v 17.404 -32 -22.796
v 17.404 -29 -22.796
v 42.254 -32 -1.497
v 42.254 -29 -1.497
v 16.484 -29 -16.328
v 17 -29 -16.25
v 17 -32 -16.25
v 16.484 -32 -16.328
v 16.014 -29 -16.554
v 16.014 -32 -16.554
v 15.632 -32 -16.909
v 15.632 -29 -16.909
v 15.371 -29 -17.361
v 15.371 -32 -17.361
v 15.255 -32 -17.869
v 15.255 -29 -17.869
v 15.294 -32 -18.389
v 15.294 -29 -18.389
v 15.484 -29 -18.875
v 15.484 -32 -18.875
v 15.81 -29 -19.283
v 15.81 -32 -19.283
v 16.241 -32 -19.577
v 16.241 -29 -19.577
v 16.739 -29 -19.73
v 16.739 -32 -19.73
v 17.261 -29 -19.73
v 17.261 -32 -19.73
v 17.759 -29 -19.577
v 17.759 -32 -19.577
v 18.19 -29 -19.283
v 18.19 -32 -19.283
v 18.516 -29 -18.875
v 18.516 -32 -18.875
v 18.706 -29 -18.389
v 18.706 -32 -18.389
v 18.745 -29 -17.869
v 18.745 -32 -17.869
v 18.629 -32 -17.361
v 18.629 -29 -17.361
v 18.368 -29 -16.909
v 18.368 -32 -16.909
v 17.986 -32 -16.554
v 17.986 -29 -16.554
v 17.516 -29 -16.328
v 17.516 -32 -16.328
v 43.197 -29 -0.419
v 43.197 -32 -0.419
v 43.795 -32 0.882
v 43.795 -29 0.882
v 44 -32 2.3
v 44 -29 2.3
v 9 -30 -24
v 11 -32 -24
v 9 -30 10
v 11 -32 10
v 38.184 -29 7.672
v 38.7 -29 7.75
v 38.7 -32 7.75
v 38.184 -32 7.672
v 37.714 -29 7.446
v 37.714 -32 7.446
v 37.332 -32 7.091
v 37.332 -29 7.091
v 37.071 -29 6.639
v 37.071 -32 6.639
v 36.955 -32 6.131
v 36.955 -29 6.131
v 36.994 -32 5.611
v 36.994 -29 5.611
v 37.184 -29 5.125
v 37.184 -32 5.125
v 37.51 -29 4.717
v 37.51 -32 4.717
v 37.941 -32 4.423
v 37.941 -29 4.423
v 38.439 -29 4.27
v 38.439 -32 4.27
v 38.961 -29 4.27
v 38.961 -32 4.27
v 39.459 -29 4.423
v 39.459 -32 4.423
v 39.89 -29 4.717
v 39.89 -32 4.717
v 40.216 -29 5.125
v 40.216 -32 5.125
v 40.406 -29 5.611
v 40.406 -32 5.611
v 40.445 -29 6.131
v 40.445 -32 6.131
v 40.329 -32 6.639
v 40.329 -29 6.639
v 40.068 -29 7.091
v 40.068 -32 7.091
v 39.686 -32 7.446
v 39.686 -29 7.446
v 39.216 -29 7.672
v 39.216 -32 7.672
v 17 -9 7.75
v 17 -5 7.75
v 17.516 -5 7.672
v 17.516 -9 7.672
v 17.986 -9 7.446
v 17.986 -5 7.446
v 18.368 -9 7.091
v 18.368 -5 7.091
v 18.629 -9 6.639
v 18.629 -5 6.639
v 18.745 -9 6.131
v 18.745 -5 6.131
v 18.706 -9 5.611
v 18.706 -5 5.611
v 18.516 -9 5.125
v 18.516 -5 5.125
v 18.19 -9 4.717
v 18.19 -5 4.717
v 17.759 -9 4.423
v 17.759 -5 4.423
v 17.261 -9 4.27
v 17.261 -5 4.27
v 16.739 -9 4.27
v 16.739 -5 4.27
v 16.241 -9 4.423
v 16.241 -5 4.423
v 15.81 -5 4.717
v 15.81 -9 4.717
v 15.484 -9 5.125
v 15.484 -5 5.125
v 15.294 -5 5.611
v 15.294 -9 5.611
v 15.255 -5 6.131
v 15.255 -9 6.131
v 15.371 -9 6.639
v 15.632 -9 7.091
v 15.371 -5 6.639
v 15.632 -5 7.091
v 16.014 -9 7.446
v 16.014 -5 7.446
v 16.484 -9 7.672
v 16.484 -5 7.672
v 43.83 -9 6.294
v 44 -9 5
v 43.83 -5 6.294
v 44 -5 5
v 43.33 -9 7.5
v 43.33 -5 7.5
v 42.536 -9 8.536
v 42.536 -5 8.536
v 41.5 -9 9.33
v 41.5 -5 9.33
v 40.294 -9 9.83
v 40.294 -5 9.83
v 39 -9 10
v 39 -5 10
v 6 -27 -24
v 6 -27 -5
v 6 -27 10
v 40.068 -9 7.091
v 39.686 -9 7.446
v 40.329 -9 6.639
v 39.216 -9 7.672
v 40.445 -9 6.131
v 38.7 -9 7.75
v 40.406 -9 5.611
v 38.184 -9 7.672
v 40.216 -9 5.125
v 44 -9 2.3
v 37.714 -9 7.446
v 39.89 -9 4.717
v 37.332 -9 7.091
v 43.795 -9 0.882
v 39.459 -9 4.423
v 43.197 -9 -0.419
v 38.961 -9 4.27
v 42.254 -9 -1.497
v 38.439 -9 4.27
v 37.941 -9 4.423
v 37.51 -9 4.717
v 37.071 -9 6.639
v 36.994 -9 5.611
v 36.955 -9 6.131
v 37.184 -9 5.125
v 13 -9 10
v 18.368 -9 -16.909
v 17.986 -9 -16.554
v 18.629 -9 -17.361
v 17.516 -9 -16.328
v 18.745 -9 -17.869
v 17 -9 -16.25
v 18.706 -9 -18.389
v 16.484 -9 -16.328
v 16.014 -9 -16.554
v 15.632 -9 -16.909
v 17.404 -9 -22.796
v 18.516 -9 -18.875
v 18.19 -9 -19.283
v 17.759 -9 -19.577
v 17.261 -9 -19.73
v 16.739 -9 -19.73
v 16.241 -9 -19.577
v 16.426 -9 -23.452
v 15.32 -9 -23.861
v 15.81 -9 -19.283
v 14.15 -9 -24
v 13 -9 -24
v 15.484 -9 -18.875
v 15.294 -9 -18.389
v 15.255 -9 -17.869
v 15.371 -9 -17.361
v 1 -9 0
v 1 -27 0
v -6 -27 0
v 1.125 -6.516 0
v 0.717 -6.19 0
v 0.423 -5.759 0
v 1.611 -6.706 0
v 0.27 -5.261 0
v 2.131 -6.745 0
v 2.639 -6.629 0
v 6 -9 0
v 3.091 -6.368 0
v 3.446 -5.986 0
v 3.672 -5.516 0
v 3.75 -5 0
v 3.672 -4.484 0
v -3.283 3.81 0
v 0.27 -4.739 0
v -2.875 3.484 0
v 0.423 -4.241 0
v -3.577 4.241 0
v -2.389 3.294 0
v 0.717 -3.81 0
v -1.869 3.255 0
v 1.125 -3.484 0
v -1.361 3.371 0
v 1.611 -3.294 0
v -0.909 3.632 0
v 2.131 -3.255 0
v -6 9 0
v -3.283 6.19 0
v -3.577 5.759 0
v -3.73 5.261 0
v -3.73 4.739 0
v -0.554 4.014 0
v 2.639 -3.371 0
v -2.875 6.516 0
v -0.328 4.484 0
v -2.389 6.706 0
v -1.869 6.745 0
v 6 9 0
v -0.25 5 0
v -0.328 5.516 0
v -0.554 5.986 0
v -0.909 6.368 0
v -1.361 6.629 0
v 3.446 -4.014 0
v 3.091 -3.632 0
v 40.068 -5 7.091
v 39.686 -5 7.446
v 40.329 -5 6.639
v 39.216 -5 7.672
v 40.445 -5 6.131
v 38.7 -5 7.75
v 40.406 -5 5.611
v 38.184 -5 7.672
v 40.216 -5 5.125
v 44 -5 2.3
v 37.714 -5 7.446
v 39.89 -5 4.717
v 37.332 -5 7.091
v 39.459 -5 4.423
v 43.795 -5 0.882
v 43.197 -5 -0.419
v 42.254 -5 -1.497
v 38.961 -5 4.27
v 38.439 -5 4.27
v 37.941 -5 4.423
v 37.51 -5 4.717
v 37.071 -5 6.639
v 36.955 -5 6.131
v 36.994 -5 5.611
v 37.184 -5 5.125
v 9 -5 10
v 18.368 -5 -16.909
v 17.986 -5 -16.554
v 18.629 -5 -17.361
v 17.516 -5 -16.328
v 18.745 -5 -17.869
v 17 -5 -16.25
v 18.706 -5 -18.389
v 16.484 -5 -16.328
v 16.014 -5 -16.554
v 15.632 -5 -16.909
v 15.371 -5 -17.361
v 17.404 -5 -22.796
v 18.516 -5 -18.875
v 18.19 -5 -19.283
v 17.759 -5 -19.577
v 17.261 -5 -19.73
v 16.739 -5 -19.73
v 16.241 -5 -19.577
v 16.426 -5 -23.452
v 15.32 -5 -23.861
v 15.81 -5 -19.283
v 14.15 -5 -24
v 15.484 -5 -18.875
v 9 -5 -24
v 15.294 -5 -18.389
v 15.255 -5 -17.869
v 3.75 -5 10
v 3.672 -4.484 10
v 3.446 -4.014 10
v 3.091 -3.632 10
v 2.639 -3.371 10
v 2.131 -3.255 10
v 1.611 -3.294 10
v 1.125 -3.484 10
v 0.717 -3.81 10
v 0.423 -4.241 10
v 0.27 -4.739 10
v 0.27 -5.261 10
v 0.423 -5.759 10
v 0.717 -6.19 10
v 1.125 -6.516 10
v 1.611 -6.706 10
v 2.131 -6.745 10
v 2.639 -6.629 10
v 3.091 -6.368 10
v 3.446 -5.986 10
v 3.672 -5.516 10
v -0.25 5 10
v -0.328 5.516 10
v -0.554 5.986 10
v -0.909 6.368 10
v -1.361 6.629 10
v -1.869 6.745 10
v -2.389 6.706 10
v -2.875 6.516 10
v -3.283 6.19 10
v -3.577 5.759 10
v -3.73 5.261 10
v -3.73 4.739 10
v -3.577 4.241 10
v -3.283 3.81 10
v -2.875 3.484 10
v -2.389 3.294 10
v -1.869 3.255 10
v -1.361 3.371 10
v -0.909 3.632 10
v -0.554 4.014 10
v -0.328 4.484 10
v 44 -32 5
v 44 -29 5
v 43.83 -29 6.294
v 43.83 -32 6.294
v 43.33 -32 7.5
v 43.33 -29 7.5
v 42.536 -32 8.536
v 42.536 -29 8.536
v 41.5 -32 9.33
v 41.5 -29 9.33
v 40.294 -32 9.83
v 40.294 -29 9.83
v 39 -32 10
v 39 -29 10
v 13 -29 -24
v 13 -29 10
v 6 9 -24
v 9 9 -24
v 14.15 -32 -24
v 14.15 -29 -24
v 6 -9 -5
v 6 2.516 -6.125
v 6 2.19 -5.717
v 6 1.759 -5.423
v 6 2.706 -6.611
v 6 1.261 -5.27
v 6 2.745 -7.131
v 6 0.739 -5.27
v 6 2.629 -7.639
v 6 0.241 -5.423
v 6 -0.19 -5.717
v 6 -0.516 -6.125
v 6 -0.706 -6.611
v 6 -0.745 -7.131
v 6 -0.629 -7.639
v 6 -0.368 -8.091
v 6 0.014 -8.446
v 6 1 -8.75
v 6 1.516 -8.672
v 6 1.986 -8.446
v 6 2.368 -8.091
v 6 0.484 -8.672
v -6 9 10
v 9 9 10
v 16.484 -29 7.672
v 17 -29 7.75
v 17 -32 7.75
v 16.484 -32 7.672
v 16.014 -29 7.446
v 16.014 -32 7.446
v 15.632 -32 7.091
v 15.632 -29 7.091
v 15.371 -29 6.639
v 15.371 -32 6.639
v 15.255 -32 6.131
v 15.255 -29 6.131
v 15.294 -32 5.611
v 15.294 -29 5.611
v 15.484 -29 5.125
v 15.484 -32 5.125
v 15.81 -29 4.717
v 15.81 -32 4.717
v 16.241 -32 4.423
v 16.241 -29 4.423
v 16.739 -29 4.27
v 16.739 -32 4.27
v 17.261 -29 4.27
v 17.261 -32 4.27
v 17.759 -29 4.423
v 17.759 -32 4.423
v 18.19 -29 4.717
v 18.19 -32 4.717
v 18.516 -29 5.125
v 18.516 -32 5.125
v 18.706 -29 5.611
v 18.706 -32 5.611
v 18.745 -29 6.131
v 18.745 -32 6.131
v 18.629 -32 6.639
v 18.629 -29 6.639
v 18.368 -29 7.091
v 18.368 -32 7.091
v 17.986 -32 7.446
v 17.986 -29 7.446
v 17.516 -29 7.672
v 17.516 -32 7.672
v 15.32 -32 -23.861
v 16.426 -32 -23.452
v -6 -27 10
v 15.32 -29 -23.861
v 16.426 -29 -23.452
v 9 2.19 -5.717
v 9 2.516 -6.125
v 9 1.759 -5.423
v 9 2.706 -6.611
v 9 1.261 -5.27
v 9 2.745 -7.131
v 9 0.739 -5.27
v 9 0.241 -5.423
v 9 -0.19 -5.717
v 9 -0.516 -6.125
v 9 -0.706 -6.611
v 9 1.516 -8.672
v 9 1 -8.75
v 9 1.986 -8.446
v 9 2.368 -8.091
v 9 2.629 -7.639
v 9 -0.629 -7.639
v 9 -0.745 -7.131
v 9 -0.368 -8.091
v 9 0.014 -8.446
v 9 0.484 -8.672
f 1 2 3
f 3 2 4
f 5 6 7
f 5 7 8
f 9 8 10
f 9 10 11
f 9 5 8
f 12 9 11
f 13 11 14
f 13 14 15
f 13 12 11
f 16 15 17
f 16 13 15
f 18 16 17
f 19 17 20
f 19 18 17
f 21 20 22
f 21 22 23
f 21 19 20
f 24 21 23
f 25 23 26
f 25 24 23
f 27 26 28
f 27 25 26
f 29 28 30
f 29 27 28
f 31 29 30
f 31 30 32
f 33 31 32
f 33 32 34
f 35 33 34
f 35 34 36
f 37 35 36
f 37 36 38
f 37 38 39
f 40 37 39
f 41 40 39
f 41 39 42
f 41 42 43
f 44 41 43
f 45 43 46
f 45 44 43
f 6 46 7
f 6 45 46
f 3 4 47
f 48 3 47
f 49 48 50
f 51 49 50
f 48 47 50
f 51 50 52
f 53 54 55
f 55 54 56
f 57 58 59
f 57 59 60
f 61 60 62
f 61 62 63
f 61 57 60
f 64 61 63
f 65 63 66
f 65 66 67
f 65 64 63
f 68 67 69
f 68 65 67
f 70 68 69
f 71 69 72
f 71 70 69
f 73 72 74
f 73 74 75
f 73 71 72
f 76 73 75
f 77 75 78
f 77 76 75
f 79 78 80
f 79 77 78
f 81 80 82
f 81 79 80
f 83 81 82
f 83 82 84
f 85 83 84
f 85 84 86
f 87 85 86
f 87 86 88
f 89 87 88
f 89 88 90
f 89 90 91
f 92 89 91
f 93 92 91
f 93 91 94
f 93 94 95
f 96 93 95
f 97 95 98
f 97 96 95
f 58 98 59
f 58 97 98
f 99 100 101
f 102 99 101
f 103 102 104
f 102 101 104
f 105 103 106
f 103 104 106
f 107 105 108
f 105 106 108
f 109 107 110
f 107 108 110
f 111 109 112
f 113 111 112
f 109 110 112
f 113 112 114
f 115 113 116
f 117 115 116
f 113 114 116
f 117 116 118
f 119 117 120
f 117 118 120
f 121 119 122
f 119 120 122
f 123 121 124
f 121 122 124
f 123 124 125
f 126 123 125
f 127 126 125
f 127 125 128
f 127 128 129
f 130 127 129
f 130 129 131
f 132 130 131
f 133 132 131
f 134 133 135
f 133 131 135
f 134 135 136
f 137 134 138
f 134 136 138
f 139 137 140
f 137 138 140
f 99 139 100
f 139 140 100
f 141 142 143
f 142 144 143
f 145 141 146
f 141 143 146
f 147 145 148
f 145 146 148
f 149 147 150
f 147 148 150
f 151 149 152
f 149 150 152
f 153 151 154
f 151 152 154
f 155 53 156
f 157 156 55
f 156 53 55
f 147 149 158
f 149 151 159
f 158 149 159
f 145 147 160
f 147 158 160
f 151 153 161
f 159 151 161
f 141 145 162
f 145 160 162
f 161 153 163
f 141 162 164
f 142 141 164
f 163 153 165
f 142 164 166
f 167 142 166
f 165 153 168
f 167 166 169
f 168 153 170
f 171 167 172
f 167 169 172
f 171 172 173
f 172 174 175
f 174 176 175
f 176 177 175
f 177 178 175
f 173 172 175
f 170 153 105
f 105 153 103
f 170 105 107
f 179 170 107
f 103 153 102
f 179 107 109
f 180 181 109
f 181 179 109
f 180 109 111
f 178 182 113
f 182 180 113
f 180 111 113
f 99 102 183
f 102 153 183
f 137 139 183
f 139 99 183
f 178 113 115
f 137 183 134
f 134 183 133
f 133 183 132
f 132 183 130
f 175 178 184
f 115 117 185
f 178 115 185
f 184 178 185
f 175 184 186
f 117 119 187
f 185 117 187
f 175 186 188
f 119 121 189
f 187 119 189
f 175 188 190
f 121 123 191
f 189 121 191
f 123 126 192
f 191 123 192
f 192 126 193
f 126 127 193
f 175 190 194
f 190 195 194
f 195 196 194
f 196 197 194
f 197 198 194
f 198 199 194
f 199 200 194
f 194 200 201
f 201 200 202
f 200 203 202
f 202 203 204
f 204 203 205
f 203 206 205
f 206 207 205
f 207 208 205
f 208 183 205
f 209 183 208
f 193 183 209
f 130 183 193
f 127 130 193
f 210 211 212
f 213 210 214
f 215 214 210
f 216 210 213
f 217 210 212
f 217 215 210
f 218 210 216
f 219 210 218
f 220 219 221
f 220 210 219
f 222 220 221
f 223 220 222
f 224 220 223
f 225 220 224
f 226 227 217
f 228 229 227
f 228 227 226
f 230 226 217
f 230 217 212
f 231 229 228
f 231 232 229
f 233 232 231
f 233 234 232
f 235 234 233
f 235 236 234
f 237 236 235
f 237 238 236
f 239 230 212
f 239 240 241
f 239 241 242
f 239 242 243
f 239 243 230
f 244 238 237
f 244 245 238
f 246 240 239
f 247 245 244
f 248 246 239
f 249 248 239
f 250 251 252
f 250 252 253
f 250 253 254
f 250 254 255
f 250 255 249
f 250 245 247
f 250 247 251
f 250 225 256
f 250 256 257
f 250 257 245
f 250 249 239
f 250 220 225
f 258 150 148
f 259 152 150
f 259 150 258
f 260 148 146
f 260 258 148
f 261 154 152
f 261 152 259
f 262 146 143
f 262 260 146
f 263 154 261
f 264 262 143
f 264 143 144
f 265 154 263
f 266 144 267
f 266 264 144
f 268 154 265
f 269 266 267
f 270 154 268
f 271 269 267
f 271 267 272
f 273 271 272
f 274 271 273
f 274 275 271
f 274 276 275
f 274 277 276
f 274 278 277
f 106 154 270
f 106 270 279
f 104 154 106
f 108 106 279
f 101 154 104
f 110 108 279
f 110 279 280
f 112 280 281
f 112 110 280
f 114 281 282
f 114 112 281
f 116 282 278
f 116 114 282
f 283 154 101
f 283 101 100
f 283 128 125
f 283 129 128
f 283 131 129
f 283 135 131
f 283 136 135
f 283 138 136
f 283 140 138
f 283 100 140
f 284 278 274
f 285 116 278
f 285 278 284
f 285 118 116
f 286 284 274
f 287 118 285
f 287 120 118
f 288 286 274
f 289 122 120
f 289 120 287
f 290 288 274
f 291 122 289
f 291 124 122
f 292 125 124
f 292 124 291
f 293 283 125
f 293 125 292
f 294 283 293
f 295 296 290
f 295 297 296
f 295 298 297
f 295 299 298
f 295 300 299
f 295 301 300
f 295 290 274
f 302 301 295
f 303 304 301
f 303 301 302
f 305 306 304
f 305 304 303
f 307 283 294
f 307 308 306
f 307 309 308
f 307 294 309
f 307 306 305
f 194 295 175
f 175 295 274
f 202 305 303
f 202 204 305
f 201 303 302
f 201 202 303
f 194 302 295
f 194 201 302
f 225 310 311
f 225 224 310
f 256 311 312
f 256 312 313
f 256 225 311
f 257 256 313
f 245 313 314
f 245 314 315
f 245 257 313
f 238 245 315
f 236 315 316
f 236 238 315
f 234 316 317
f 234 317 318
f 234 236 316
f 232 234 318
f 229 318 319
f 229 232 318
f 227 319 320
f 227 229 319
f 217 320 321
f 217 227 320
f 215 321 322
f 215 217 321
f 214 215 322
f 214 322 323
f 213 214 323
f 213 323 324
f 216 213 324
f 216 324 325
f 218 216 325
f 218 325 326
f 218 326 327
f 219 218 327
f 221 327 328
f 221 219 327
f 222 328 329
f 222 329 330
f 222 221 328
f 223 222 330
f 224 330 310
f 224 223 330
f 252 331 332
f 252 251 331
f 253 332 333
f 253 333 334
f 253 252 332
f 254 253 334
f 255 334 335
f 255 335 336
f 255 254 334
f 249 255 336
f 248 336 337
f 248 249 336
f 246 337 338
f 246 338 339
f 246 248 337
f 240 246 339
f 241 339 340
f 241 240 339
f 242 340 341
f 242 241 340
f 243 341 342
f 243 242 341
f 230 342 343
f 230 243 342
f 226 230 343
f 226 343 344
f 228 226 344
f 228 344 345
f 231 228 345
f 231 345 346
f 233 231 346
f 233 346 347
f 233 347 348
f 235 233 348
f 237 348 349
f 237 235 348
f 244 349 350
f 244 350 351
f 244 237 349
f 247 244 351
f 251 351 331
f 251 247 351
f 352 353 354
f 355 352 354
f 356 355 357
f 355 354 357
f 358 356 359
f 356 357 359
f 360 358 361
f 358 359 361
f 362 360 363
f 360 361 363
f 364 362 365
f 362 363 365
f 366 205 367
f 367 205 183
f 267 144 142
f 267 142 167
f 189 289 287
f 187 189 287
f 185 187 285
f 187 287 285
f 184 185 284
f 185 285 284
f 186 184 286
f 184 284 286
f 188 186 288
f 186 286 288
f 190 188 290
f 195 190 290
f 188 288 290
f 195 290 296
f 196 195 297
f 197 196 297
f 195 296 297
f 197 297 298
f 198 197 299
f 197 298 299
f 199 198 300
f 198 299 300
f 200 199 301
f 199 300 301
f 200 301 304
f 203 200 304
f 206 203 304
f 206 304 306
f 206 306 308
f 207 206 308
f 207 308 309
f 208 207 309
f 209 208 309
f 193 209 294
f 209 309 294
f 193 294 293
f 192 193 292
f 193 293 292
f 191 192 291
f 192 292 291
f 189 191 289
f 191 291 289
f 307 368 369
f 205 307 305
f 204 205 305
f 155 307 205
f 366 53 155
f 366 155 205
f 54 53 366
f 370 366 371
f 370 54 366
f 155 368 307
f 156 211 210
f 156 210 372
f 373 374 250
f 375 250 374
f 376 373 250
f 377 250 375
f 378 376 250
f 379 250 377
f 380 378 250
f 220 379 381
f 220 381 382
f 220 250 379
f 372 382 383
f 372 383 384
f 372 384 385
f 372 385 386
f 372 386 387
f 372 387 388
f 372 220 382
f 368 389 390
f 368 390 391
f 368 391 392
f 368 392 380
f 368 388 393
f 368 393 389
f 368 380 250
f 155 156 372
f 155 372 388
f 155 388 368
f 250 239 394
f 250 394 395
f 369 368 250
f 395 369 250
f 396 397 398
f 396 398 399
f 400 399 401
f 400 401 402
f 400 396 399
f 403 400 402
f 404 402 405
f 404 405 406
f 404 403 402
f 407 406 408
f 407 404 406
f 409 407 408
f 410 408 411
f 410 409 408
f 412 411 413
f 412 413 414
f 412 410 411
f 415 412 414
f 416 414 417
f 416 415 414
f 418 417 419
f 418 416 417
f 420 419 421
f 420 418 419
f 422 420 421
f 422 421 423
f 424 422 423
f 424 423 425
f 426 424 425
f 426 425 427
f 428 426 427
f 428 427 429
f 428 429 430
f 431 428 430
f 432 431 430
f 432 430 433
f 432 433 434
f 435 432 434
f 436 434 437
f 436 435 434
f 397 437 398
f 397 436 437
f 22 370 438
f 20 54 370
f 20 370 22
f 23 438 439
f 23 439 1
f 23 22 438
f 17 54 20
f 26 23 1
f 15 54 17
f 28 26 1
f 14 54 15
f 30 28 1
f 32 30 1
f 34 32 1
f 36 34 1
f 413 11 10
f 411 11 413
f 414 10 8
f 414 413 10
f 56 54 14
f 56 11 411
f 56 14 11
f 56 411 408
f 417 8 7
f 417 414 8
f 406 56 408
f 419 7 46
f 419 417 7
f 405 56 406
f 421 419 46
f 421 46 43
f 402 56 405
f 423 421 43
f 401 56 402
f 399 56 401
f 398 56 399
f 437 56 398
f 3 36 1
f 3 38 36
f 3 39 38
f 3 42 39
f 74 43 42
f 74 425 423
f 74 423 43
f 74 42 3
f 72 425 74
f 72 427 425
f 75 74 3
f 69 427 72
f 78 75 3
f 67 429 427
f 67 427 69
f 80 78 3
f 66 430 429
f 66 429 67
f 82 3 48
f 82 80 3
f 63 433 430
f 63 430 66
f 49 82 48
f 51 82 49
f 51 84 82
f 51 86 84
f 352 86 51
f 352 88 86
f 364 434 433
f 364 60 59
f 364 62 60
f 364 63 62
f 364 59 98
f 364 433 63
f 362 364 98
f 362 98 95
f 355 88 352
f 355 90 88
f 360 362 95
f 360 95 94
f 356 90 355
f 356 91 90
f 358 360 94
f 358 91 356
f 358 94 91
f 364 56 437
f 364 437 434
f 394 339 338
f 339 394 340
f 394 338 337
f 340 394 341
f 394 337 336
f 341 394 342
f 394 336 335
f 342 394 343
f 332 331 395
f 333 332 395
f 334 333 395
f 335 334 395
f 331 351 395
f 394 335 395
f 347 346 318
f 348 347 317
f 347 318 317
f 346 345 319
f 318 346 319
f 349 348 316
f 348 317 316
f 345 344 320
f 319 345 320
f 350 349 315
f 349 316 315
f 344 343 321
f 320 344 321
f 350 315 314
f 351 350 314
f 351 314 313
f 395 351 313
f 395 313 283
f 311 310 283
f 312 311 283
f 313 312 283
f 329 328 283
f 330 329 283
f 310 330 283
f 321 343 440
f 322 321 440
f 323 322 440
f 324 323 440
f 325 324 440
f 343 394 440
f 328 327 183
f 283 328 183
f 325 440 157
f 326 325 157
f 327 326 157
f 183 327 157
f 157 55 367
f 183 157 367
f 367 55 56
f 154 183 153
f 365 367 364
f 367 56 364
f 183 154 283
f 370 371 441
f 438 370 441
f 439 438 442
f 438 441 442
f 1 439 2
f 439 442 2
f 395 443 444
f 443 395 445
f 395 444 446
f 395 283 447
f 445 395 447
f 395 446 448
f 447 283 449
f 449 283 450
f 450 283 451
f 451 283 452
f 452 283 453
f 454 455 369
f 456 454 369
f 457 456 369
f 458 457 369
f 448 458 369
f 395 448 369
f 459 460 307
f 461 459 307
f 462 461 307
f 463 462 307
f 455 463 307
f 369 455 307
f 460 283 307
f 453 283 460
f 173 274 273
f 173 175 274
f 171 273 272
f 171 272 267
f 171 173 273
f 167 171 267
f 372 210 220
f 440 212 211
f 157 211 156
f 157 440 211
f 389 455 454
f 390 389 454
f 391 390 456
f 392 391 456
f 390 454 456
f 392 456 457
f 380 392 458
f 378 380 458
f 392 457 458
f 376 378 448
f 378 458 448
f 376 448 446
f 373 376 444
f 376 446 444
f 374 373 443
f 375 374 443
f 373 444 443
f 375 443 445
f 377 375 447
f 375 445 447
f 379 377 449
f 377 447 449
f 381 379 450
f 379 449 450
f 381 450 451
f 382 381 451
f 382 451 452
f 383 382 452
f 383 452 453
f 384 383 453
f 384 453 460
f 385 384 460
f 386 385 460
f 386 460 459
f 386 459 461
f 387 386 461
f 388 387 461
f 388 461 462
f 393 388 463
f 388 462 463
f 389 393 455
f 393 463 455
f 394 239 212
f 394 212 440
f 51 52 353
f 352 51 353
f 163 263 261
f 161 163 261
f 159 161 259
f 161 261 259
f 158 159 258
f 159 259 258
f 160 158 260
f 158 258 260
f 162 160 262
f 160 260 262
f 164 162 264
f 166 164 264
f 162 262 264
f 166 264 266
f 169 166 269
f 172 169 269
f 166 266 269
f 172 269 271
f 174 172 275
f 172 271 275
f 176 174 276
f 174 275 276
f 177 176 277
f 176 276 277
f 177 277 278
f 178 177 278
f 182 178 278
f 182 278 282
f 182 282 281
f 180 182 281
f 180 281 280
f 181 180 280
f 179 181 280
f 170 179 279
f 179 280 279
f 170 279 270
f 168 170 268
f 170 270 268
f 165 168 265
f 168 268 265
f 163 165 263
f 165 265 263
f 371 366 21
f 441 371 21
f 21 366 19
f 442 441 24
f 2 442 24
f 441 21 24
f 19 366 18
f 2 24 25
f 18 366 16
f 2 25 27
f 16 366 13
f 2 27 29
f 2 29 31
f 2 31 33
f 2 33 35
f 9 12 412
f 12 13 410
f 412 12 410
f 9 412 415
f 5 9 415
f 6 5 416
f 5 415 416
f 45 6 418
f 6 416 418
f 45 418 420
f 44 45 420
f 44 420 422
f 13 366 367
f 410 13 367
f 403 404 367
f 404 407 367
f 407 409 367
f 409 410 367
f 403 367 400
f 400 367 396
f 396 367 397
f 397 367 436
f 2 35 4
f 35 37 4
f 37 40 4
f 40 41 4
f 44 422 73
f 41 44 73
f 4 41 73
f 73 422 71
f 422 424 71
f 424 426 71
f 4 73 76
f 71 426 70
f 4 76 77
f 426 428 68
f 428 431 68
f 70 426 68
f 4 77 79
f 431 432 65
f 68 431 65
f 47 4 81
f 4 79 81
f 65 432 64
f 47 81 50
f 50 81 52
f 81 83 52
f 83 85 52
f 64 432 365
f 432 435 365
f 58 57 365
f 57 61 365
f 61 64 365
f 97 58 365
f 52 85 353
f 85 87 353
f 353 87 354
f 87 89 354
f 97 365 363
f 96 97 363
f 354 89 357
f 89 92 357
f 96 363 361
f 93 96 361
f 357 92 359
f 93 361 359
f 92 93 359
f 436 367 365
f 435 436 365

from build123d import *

# Parameters (mm, degrees)
SZKIC1_W                     = 12
SZKIC1_H                     = 18
SZKIC1_R                     = 1.75
DODANIE_WYCI_GNI_CIE1_DEPTH  = 5
SZKIC2_W                     = 12
SZKIC2_H                     = 36
SZKIC2_R                     = 1.75
DODANIE_WYCI_GNI_CIE2_DEPTH  = 5
SZKIC5_W                     = 34
SZKIC5_H                     = 4
DODANIE_WYCI_GNI_CIE5_DEPTH  = 38
SZKIC6_W                     = 7
SZKIC6_H                     = 34
DODANIE_WYCI_GNI_CIE6_DEPTH  = 18
SZKIC7_R                     = 1.75
WYTNIJ_WYCI_GNI_CIE1_DEPTH   = 4
WYTNIJ_WYCI_GNI_CIE2_DEPTH   = 4
ZAOKR_GLENIE1_R              = 5
SZKIC9_W                     = 5
SZKIC9_H                     = 18
DODANIE_WYCI_GNI_CIE7_DEPTH  = 12
DODANIE_WYCI_GNI_CIE8_DEPTH  = 18
SZKIC11_W                    = 4
SZKIC11_H                    = 34
DODANIE_WYCI_GNI_CIE9_DEPTH  = 2
SZKIC12_R                    = 1.75
SZKIC12_W                    = 4
SZKIC12_H                    = 34
DODANIE_WYCI_GNI_CIE10_DEPTH = 3
SFAZOWANIE1_SIZE             = 3
SFAZOWANIE2_SIZE             = 2
SZKIC13_W                    = 3
SZKIC13_H                    = 34
DODANIE_WYCI_GNI_CIE11_DEPTH = 14
SZKIC14_R                    = 1.75
WYTNIJ_WYCI_GNI_CIE3_DEPTH   = 3


with BuildPart() as part:
    # Szkic1 → Dodanie-wyciągnięcie1 (new body)
    with BuildSketch(Plane.XY):
        Rectangle(SZKIC1_W, SZKIC1_H)
        with Locations((-2, 5)):
            Circle(SZKIC1_R, mode=Mode.SUBTRACT)
        with Locations((2, -5)):
            Circle(SZKIC1_R, mode=Mode.SUBTRACT)
    extrude(amount=DODANIE_WYCI_GNI_CIE1_DEPTH)

    # Szkic2 → Dodanie-wyciągnięcie2 (add)
    with BuildSketch(Plane.XY.offset(5)):
        with Locations((0, -9)):
            Rectangle(SZKIC2_W, SZKIC2_H)
        with Locations((-2, 5)):
            Circle(SZKIC2_R, mode=Mode.SUBTRACT)
        with Locations((2, -5)):
            Circle(SZKIC2_R, mode=Mode.SUBTRACT)
    extrude(amount=DODANIE_WYCI_GNI_CIE2_DEPTH)

    # Szkic5 → Dodanie-wyciągnięcie5 (add)
    with BuildSketch(Plane(origin=(6, 0, 0), x_dir=(0, 0, -1), z_dir=(1, 0, 0))):
        with Locations((7, -7)):
            Rectangle(SZKIC5_W, SZKIC5_H)
    extrude(amount=DODANIE_WYCI_GNI_CIE5_DEPTH)

    # Szkic6 → Dodanie-wyciągnięcie6 (add)
    with BuildSketch(Plane.XZ.offset(9)):
        with Locations((9.5, -7)):
            Rectangle(SZKIC6_W, SZKIC6_H)
    extrude(amount=DODANIE_WYCI_GNI_CIE6_DEPTH)

    # Szkic7 → Wytnij-wyciągnięcie1 (cut)
    with BuildSketch(Plane(origin=(0, -5, 0), x_dir=(1, 0, 0), z_dir=(0, 1, 0))):
        with Locations(Location((17, -6, 0), (0, 0, 270))):
            Circle(SZKIC7_R)
        with Locations(Location((17, 18, 0), (0, 0, 270))):
            Circle(SZKIC7_R)
        with Locations(Location((38.7, -6, 0), (0, 0, 270))):
            Circle(SZKIC7_R)
    extrude(amount=-WYTNIJ_WYCI_GNI_CIE1_DEPTH, mode=Mode.SUBTRACT)

    # Szkic8 → Wytnij-wyciągnięcie2 (cut)
    with BuildSketch(Plane(origin=(0, -5, 0), x_dir=(1, 0, 0), z_dir=(0, 1, 0))):
        Polygon((44, 24), (16, 24), (44, 0), align=None)
    extrude(amount=-WYTNIJ_WYCI_GNI_CIE2_DEPTH, mode=Mode.SUBTRACT)

    # Zaokrąglenie1
    zaokr_glenie1_edges = [part.edges().sort_by_distance(p)[0] for p in [
        (44, -7, 10),
        (16, -7, -24),
        (44, -7, 0),
    ]]
    fillet(zaokr_glenie1_edges, radius=ZAOKR_GLENIE1_R)

    # Szkic9 → Dodanie-wyciągnięcie7 (add)
    with BuildSketch(Plane.ZY.offset(-6)):
        with Locations((2.5, -18)):
            Rectangle(SZKIC9_W, SZKIC9_H)
    extrude(amount=DODANIE_WYCI_GNI_CIE7_DEPTH)

    # Szkic10 → Dodanie-wyciągnięcie8 (add)
    with BuildSketch(Plane.XZ.offset(27)):
        Polygon((6, 0), (1, 0), (6, -5), align=None)
    extrude(amount=-DODANIE_WYCI_GNI_CIE8_DEPTH)

    # Szkic11 → Dodanie-wyciągnięcie9 (add)
    with BuildSketch(Plane.XZ.offset(27)):
        with Locations((11, -7)):
            Rectangle(SZKIC11_W, SZKIC11_H)
    extrude(amount=DODANIE_WYCI_GNI_CIE9_DEPTH)

    # Szkic12 → Dodanie-wyciągnięcie10 (add)
    # profile 1 of 2: a face of its own
    with BuildSketch(Plane.XZ.offset(29)):
        with BuildLine():
            Line((44, 2.299674612), (44, 5))
            ThreePointArc((44, 5), (42.535533906, 8.535533906), (39, 10))
            Line((39, 10), (13, 10))
            Line((13, 10), (13, -24))
            Line((13, -24), (14.150379619, -24))
            ThreePointArc((14.150379619, -24), (15.885110858, -23.689425075), (17.404336486, -22.796283012))
            Line((17.404336486, -22.796283012), (42.253956867, -1.496608399))
            ThreePointArc((42.253956867, -1.496608399), (43.542564492, 0.210390565), (44, 2.299674612))
        make_face()
        with Locations(Location((38.7, 6, 0), (0, 0, 90))):
            Circle(SZKIC12_R, mode=Mode.SUBTRACT)
        with Locations(Location((17, -18, 0), (0, 0, 90))):
            Circle(SZKIC12_R, mode=Mode.SUBTRACT)
        with Locations(Location((17, 6, 0), (0, 0, 90))):
            Circle(SZKIC12_R, mode=Mode.SUBTRACT)
    # profile 2 of 2: a face of its own
    with BuildSketch(Plane.XZ.offset(29)):
        with Locations((11, -7)):
            Rectangle(SZKIC12_W, SZKIC12_H)
    extrude(amount=DODANIE_WYCI_GNI_CIE10_DEPTH)

    # Sfazowanie1
    sfazowanie1_edges = [part.edges().sort_by_distance(p)[0] for p in [
        (9, -27, -7),
    ]]
    chamfer(sfazowanie1_edges, length=SFAZOWANIE1_SIZE)

    # Sfazowanie2
    sfazowanie2_edges = [part.edges().sort_by_distance(p)[0] for p in [
        (9, -32, -7),
    ]]
    chamfer(sfazowanie2_edges, length=SFAZOWANIE2_SIZE - 0.0001)  # a hair under: the kernel refuses the full size

    # Szkic13 → Dodanie-wyciągnięcie11 (add)
    with BuildSketch(Plane(origin=(0, -5, 0), x_dir=(1, 0, 0), z_dir=(0, 1, 0))):
        with Locations((7.5, 7)):
            Rectangle(SZKIC13_W, SZKIC13_H)
    extrude(amount=DODANIE_WYCI_GNI_CIE11_DEPTH)

    # Szkic14 → Wytnij-wyciągnięcie3 (cut)
    with BuildSketch(Plane(origin=(9, 0, 0), x_dir=(0, 0, -1), z_dir=(1, 0, 0))):
        with Locations((7, 1)):
            Circle(SZKIC14_R)
    extrude(amount=-WYTNIJ_WYCI_GNI_CIE3_DEPTH, mode=Mode.SUBTRACT)


solid = part.part
